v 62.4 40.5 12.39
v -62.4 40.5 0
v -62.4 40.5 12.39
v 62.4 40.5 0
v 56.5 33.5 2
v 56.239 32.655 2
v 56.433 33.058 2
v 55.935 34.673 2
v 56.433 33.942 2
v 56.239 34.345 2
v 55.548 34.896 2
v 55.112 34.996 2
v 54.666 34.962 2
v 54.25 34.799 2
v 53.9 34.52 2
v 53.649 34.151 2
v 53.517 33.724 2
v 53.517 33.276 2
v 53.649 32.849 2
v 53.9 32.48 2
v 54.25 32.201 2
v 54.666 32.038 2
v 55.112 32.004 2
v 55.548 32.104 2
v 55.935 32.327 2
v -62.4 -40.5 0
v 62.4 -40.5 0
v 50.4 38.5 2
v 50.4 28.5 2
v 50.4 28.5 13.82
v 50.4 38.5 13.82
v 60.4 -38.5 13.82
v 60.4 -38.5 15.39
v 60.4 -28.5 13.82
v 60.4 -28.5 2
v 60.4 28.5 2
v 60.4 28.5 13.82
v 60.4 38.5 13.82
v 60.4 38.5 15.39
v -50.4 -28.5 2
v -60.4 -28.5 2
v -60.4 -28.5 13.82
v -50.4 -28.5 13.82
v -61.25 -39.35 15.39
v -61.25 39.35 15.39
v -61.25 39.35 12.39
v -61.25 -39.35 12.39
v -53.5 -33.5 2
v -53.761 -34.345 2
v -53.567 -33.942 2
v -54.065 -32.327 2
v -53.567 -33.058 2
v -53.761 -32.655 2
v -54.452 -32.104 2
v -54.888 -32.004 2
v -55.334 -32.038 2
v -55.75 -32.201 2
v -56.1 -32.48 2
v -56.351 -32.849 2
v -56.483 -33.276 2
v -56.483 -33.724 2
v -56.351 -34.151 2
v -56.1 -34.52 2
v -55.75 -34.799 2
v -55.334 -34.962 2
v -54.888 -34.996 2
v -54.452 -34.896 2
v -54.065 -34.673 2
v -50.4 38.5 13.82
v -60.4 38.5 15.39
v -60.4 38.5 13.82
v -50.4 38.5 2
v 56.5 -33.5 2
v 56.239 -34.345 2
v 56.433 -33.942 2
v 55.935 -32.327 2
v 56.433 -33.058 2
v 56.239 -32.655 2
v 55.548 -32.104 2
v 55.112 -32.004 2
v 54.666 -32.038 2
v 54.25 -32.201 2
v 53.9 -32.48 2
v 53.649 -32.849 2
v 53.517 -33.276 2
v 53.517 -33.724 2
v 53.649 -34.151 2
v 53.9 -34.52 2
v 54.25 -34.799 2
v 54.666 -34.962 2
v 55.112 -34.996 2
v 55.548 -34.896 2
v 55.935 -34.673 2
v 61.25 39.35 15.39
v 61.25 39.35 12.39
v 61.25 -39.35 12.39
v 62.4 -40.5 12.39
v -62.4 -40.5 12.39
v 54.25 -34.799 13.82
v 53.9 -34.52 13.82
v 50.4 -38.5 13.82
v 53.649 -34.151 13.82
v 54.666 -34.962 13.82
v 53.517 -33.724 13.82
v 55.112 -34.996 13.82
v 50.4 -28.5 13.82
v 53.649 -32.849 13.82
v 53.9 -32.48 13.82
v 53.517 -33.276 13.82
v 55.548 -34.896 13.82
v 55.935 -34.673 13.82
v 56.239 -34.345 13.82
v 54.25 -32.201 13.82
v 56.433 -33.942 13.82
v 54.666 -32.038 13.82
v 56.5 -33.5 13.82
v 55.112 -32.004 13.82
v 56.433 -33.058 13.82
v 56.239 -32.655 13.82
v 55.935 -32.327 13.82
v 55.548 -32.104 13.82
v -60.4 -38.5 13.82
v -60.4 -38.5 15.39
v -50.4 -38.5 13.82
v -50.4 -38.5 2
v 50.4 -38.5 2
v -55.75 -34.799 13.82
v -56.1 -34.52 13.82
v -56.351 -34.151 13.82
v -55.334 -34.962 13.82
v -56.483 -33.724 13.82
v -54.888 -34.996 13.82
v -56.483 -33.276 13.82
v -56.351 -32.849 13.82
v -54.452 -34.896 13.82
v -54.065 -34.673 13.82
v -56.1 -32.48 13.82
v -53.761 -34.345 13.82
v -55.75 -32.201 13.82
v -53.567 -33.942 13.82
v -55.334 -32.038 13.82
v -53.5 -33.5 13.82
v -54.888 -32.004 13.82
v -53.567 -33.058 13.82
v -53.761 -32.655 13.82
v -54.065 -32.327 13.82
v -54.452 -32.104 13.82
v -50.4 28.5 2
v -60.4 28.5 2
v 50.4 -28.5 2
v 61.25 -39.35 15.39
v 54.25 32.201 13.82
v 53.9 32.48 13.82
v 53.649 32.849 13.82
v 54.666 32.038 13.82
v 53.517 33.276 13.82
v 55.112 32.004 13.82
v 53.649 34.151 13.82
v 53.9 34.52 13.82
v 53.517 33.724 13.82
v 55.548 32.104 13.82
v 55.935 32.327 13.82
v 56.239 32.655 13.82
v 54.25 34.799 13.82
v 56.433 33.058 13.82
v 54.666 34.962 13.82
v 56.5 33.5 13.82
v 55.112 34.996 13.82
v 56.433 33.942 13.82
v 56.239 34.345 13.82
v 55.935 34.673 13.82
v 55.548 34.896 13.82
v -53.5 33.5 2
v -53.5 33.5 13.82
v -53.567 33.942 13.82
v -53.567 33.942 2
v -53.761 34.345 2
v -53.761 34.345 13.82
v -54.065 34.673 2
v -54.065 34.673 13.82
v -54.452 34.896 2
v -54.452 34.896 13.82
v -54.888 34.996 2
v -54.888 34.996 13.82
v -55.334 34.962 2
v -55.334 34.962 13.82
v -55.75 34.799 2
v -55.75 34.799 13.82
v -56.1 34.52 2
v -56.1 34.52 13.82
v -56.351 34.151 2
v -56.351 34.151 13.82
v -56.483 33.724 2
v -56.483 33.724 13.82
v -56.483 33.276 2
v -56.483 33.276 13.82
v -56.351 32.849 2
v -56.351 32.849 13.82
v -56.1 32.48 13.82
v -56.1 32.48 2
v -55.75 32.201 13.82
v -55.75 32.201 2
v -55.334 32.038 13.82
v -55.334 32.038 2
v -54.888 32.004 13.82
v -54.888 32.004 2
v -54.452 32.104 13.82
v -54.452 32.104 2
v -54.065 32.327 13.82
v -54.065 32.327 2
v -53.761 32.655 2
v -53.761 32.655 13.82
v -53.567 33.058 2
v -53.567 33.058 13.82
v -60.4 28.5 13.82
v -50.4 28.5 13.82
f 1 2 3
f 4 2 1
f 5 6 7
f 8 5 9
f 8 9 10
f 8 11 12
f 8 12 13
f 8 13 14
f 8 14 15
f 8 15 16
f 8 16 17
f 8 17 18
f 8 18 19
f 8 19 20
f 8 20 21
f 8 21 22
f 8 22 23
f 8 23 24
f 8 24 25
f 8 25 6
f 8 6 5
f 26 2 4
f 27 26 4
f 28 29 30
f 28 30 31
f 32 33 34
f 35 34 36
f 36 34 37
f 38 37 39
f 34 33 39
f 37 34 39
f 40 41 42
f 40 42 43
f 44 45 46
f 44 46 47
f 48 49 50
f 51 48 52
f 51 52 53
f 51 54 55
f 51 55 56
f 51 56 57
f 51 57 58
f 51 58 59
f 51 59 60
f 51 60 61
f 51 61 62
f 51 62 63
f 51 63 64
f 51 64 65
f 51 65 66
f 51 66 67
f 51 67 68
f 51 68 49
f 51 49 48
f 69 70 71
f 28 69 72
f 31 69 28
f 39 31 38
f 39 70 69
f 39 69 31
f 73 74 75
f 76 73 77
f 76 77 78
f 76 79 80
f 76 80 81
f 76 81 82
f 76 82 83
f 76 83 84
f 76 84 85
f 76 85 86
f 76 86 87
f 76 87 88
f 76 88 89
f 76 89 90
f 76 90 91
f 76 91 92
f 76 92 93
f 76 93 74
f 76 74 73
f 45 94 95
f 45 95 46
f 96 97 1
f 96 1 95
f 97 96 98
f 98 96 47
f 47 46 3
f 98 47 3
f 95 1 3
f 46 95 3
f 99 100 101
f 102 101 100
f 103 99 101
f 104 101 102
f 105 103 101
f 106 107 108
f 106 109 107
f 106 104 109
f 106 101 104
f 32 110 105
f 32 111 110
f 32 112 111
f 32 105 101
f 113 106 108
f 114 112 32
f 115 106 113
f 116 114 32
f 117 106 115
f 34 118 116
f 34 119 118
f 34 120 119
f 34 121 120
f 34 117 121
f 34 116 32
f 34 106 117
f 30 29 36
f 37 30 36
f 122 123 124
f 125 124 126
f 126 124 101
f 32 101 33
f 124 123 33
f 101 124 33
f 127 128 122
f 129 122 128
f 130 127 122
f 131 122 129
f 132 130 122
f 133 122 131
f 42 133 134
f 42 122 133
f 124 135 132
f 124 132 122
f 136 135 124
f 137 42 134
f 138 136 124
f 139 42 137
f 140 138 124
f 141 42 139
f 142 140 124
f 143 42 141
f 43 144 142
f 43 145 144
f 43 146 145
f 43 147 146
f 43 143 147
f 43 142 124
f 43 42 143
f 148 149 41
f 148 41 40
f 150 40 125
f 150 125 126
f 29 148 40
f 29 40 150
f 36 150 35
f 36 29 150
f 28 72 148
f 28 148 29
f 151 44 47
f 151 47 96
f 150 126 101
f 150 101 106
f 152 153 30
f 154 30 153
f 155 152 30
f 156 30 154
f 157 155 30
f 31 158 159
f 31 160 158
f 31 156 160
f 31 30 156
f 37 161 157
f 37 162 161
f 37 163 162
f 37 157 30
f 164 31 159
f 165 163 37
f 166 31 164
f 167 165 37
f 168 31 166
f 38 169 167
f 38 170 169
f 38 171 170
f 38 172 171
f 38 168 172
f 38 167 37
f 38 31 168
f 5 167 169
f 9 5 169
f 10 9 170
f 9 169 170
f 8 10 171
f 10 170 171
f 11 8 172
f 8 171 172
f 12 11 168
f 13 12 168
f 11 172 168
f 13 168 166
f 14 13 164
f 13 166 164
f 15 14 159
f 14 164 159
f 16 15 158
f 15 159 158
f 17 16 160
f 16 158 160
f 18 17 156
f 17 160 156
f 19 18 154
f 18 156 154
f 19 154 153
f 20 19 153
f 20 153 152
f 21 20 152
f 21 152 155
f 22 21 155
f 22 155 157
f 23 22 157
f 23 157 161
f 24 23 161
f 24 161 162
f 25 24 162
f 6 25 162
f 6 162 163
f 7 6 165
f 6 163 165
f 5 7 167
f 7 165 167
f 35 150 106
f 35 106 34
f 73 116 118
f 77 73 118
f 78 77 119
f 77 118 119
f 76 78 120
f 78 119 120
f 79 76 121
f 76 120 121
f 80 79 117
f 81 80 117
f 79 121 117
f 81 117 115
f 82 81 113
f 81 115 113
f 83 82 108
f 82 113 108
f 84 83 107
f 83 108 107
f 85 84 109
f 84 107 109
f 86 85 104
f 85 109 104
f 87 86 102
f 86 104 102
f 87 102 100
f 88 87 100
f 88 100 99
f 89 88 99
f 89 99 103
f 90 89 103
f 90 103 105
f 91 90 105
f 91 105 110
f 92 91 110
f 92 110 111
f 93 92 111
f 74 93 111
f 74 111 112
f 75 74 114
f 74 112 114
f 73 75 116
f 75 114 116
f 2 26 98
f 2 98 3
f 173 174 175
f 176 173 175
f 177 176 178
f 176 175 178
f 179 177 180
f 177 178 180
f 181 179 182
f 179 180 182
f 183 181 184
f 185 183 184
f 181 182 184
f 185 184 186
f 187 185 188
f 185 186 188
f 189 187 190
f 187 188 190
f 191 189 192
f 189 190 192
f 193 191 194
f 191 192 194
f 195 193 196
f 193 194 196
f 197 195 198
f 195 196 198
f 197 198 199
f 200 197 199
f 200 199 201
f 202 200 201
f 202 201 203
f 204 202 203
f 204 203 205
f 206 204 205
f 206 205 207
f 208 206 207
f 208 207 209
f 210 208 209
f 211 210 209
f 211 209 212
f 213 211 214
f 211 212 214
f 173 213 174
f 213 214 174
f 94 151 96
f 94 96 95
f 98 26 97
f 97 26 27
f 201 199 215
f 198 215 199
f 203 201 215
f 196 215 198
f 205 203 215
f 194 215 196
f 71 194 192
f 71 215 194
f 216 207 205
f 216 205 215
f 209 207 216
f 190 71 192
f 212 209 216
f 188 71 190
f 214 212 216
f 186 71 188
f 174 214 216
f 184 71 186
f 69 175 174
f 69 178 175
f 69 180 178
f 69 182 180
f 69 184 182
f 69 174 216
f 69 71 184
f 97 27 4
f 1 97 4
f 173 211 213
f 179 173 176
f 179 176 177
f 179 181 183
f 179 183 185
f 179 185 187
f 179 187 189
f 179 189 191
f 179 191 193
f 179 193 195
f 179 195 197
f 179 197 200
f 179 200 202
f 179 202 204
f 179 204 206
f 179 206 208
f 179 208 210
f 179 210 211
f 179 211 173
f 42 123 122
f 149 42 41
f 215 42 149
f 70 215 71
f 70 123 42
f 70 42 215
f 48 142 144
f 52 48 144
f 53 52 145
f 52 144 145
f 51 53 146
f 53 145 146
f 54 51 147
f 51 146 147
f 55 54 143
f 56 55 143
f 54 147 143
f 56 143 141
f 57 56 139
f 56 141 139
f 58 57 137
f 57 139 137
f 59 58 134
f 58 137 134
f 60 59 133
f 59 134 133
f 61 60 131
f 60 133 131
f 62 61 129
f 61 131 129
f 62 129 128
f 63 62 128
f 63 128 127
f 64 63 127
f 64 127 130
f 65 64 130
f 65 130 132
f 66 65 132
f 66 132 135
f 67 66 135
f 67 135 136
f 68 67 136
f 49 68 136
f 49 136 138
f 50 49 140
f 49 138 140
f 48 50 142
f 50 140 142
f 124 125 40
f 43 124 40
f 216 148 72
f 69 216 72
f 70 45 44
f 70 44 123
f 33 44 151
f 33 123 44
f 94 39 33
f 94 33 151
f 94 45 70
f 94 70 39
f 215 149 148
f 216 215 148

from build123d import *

# Parameters (mm, degrees)
F0_W      = 124.8
F0_H      = 81
F1_DEPTH  = 15.39
F2_W      = 120.8
F2_H      = 77
F3_DEPTH  = 13.39
F4_W      = 124.8
F4_H      = 3
F5_DEPTH  = 1.15
F6_W      = 124.8
F6_H      = 3
F7_DEPTH  = 1.15
F8_W      = 78.7
F8_H      = 3
F9_DEPTH  = 1.15
F10_W     = 78.7
F10_H     = 3
F11_DEPTH = 1.15
F12_W     = 10
F12_H     = 10
F13_DEPTH = 11.82
F14_W     = 10
F14_H     = 10
F15_DEPTH = 11.82
F16_W     = 10
F16_H     = 10
F17_DEPTH = 11.82
F18_W     = 10
F18_H     = 10
F19_DEPTH = 11.82
F20_R     = 1.5
F21_DEPTH = 11.82
F22_R     = 1.5
F23_DEPTH = 11.82
F24_R     = 1.5
F25_DEPTH = 11.82
F26_R     = 1.5
F27_DEPTH = 11.82


with BuildPart() as f1:
    # F0 (on Top) → F1 (new body)
    with BuildSketch(Plane.XY):
        Rectangle(F0_W, F0_H)
    extrude(amount=F1_DEPTH)

    # F2 (on face) → F3 (cut)
    with BuildSketch(Plane.XY.offset(15.39)):
        Rectangle(F2_W, F2_H)
    extrude(amount=-F3_DEPTH, mode=Mode.SUBTRACT)

    # F4 (on face) → F5 (cut)
    with BuildSketch(Plane(origin=(0, 40.5, 0), x_dir=(-1, 0, 0), z_dir=(0, 1, 0))):
        with Locations((0, 13.89)):
            Rectangle(F4_W, F4_H)
    extrude(amount=-F5_DEPTH, mode=Mode.SUBTRACT)

    # F6 (on face) → F7 (cut)
    with BuildSketch(Plane.XZ.offset(40.5)):
        with Locations((0, 13.89)):
            Rectangle(F6_W, F6_H)
    extrude(amount=-F7_DEPTH, mode=Mode.SUBTRACT)

    # F8 (on face) → F9 (cut)
    with BuildSketch(Plane(origin=(-62.4, 0, 0), x_dir=(0, -1, 0), z_dir=(-1, 0, 0))):
        with Locations((0, 13.89)):
            Rectangle(F8_W, F8_H)
    extrude(amount=-F9_DEPTH, mode=Mode.SUBTRACT)

    # F10 (on face) → F11 (cut)
    with BuildSketch(Plane.YZ.offset(62.4)):
        with Locations((0, 13.89)):
            Rectangle(F10_W, F10_H)
    extrude(amount=-F11_DEPTH, mode=Mode.SUBTRACT)

    # F12 (on face) → F13 (join)
    with BuildSketch(Plane.XY.offset(2)):
        with Locations((-55.4, 33.5)):
            Rectangle(F12_W, F12_H)
    extrude(amount=F13_DEPTH)

    # F14 (on face) → F15 (join)
    with BuildSketch(Plane.XY.offset(2)):
        with Locations((-55.4, -33.5)):
            Rectangle(F14_W, F14_H)
    extrude(amount=F15_DEPTH)

    # F16 (on face) → F17 (join)
    with BuildSketch(Plane.XY.offset(2)):
        with Locations((55.4, -33.5)):
            Rectangle(F16_W, F16_H)
    extrude(amount=F17_DEPTH)

    # F18 (on face) → F19 (join)
    with BuildSketch(Plane.XY.offset(2)):
        with Locations((55.4, 33.5)):
            Rectangle(F18_W, F18_H)
    extrude(amount=F19_DEPTH)

    # F20 (on face) → F21 (cut)
    with BuildSketch(Plane.XY.offset(13.82)):
        with Locations((-55, 33.5)):
            Circle(F20_R)
    extrude(amount=-F21_DEPTH, mode=Mode.SUBTRACT)

    # F22 (on face) → F23 (cut)
    with BuildSketch(Plane.XY.offset(13.82)):
        with Locations((-55, -33.5)):
            Circle(F22_R)
    extrude(amount=-F23_DEPTH, mode=Mode.SUBTRACT)

    # F24 (on face) → F25 (cut)
    with BuildSketch(Plane.XY.offset(13.82)):
        with Locations((55, -33.5)):
            Circle(F24_R)
    extrude(amount=-F25_DEPTH, mode=Mode.SUBTRACT)

    # F26 (on face) → F27 (cut)
    with BuildSketch(Plane.XY.offset(13.82)):
        with Locations((55, 33.5)):
            Circle(F26_R)
    extrude(amount=-F27_DEPTH, mode=Mode.SUBTRACT)


solid = f1.part
